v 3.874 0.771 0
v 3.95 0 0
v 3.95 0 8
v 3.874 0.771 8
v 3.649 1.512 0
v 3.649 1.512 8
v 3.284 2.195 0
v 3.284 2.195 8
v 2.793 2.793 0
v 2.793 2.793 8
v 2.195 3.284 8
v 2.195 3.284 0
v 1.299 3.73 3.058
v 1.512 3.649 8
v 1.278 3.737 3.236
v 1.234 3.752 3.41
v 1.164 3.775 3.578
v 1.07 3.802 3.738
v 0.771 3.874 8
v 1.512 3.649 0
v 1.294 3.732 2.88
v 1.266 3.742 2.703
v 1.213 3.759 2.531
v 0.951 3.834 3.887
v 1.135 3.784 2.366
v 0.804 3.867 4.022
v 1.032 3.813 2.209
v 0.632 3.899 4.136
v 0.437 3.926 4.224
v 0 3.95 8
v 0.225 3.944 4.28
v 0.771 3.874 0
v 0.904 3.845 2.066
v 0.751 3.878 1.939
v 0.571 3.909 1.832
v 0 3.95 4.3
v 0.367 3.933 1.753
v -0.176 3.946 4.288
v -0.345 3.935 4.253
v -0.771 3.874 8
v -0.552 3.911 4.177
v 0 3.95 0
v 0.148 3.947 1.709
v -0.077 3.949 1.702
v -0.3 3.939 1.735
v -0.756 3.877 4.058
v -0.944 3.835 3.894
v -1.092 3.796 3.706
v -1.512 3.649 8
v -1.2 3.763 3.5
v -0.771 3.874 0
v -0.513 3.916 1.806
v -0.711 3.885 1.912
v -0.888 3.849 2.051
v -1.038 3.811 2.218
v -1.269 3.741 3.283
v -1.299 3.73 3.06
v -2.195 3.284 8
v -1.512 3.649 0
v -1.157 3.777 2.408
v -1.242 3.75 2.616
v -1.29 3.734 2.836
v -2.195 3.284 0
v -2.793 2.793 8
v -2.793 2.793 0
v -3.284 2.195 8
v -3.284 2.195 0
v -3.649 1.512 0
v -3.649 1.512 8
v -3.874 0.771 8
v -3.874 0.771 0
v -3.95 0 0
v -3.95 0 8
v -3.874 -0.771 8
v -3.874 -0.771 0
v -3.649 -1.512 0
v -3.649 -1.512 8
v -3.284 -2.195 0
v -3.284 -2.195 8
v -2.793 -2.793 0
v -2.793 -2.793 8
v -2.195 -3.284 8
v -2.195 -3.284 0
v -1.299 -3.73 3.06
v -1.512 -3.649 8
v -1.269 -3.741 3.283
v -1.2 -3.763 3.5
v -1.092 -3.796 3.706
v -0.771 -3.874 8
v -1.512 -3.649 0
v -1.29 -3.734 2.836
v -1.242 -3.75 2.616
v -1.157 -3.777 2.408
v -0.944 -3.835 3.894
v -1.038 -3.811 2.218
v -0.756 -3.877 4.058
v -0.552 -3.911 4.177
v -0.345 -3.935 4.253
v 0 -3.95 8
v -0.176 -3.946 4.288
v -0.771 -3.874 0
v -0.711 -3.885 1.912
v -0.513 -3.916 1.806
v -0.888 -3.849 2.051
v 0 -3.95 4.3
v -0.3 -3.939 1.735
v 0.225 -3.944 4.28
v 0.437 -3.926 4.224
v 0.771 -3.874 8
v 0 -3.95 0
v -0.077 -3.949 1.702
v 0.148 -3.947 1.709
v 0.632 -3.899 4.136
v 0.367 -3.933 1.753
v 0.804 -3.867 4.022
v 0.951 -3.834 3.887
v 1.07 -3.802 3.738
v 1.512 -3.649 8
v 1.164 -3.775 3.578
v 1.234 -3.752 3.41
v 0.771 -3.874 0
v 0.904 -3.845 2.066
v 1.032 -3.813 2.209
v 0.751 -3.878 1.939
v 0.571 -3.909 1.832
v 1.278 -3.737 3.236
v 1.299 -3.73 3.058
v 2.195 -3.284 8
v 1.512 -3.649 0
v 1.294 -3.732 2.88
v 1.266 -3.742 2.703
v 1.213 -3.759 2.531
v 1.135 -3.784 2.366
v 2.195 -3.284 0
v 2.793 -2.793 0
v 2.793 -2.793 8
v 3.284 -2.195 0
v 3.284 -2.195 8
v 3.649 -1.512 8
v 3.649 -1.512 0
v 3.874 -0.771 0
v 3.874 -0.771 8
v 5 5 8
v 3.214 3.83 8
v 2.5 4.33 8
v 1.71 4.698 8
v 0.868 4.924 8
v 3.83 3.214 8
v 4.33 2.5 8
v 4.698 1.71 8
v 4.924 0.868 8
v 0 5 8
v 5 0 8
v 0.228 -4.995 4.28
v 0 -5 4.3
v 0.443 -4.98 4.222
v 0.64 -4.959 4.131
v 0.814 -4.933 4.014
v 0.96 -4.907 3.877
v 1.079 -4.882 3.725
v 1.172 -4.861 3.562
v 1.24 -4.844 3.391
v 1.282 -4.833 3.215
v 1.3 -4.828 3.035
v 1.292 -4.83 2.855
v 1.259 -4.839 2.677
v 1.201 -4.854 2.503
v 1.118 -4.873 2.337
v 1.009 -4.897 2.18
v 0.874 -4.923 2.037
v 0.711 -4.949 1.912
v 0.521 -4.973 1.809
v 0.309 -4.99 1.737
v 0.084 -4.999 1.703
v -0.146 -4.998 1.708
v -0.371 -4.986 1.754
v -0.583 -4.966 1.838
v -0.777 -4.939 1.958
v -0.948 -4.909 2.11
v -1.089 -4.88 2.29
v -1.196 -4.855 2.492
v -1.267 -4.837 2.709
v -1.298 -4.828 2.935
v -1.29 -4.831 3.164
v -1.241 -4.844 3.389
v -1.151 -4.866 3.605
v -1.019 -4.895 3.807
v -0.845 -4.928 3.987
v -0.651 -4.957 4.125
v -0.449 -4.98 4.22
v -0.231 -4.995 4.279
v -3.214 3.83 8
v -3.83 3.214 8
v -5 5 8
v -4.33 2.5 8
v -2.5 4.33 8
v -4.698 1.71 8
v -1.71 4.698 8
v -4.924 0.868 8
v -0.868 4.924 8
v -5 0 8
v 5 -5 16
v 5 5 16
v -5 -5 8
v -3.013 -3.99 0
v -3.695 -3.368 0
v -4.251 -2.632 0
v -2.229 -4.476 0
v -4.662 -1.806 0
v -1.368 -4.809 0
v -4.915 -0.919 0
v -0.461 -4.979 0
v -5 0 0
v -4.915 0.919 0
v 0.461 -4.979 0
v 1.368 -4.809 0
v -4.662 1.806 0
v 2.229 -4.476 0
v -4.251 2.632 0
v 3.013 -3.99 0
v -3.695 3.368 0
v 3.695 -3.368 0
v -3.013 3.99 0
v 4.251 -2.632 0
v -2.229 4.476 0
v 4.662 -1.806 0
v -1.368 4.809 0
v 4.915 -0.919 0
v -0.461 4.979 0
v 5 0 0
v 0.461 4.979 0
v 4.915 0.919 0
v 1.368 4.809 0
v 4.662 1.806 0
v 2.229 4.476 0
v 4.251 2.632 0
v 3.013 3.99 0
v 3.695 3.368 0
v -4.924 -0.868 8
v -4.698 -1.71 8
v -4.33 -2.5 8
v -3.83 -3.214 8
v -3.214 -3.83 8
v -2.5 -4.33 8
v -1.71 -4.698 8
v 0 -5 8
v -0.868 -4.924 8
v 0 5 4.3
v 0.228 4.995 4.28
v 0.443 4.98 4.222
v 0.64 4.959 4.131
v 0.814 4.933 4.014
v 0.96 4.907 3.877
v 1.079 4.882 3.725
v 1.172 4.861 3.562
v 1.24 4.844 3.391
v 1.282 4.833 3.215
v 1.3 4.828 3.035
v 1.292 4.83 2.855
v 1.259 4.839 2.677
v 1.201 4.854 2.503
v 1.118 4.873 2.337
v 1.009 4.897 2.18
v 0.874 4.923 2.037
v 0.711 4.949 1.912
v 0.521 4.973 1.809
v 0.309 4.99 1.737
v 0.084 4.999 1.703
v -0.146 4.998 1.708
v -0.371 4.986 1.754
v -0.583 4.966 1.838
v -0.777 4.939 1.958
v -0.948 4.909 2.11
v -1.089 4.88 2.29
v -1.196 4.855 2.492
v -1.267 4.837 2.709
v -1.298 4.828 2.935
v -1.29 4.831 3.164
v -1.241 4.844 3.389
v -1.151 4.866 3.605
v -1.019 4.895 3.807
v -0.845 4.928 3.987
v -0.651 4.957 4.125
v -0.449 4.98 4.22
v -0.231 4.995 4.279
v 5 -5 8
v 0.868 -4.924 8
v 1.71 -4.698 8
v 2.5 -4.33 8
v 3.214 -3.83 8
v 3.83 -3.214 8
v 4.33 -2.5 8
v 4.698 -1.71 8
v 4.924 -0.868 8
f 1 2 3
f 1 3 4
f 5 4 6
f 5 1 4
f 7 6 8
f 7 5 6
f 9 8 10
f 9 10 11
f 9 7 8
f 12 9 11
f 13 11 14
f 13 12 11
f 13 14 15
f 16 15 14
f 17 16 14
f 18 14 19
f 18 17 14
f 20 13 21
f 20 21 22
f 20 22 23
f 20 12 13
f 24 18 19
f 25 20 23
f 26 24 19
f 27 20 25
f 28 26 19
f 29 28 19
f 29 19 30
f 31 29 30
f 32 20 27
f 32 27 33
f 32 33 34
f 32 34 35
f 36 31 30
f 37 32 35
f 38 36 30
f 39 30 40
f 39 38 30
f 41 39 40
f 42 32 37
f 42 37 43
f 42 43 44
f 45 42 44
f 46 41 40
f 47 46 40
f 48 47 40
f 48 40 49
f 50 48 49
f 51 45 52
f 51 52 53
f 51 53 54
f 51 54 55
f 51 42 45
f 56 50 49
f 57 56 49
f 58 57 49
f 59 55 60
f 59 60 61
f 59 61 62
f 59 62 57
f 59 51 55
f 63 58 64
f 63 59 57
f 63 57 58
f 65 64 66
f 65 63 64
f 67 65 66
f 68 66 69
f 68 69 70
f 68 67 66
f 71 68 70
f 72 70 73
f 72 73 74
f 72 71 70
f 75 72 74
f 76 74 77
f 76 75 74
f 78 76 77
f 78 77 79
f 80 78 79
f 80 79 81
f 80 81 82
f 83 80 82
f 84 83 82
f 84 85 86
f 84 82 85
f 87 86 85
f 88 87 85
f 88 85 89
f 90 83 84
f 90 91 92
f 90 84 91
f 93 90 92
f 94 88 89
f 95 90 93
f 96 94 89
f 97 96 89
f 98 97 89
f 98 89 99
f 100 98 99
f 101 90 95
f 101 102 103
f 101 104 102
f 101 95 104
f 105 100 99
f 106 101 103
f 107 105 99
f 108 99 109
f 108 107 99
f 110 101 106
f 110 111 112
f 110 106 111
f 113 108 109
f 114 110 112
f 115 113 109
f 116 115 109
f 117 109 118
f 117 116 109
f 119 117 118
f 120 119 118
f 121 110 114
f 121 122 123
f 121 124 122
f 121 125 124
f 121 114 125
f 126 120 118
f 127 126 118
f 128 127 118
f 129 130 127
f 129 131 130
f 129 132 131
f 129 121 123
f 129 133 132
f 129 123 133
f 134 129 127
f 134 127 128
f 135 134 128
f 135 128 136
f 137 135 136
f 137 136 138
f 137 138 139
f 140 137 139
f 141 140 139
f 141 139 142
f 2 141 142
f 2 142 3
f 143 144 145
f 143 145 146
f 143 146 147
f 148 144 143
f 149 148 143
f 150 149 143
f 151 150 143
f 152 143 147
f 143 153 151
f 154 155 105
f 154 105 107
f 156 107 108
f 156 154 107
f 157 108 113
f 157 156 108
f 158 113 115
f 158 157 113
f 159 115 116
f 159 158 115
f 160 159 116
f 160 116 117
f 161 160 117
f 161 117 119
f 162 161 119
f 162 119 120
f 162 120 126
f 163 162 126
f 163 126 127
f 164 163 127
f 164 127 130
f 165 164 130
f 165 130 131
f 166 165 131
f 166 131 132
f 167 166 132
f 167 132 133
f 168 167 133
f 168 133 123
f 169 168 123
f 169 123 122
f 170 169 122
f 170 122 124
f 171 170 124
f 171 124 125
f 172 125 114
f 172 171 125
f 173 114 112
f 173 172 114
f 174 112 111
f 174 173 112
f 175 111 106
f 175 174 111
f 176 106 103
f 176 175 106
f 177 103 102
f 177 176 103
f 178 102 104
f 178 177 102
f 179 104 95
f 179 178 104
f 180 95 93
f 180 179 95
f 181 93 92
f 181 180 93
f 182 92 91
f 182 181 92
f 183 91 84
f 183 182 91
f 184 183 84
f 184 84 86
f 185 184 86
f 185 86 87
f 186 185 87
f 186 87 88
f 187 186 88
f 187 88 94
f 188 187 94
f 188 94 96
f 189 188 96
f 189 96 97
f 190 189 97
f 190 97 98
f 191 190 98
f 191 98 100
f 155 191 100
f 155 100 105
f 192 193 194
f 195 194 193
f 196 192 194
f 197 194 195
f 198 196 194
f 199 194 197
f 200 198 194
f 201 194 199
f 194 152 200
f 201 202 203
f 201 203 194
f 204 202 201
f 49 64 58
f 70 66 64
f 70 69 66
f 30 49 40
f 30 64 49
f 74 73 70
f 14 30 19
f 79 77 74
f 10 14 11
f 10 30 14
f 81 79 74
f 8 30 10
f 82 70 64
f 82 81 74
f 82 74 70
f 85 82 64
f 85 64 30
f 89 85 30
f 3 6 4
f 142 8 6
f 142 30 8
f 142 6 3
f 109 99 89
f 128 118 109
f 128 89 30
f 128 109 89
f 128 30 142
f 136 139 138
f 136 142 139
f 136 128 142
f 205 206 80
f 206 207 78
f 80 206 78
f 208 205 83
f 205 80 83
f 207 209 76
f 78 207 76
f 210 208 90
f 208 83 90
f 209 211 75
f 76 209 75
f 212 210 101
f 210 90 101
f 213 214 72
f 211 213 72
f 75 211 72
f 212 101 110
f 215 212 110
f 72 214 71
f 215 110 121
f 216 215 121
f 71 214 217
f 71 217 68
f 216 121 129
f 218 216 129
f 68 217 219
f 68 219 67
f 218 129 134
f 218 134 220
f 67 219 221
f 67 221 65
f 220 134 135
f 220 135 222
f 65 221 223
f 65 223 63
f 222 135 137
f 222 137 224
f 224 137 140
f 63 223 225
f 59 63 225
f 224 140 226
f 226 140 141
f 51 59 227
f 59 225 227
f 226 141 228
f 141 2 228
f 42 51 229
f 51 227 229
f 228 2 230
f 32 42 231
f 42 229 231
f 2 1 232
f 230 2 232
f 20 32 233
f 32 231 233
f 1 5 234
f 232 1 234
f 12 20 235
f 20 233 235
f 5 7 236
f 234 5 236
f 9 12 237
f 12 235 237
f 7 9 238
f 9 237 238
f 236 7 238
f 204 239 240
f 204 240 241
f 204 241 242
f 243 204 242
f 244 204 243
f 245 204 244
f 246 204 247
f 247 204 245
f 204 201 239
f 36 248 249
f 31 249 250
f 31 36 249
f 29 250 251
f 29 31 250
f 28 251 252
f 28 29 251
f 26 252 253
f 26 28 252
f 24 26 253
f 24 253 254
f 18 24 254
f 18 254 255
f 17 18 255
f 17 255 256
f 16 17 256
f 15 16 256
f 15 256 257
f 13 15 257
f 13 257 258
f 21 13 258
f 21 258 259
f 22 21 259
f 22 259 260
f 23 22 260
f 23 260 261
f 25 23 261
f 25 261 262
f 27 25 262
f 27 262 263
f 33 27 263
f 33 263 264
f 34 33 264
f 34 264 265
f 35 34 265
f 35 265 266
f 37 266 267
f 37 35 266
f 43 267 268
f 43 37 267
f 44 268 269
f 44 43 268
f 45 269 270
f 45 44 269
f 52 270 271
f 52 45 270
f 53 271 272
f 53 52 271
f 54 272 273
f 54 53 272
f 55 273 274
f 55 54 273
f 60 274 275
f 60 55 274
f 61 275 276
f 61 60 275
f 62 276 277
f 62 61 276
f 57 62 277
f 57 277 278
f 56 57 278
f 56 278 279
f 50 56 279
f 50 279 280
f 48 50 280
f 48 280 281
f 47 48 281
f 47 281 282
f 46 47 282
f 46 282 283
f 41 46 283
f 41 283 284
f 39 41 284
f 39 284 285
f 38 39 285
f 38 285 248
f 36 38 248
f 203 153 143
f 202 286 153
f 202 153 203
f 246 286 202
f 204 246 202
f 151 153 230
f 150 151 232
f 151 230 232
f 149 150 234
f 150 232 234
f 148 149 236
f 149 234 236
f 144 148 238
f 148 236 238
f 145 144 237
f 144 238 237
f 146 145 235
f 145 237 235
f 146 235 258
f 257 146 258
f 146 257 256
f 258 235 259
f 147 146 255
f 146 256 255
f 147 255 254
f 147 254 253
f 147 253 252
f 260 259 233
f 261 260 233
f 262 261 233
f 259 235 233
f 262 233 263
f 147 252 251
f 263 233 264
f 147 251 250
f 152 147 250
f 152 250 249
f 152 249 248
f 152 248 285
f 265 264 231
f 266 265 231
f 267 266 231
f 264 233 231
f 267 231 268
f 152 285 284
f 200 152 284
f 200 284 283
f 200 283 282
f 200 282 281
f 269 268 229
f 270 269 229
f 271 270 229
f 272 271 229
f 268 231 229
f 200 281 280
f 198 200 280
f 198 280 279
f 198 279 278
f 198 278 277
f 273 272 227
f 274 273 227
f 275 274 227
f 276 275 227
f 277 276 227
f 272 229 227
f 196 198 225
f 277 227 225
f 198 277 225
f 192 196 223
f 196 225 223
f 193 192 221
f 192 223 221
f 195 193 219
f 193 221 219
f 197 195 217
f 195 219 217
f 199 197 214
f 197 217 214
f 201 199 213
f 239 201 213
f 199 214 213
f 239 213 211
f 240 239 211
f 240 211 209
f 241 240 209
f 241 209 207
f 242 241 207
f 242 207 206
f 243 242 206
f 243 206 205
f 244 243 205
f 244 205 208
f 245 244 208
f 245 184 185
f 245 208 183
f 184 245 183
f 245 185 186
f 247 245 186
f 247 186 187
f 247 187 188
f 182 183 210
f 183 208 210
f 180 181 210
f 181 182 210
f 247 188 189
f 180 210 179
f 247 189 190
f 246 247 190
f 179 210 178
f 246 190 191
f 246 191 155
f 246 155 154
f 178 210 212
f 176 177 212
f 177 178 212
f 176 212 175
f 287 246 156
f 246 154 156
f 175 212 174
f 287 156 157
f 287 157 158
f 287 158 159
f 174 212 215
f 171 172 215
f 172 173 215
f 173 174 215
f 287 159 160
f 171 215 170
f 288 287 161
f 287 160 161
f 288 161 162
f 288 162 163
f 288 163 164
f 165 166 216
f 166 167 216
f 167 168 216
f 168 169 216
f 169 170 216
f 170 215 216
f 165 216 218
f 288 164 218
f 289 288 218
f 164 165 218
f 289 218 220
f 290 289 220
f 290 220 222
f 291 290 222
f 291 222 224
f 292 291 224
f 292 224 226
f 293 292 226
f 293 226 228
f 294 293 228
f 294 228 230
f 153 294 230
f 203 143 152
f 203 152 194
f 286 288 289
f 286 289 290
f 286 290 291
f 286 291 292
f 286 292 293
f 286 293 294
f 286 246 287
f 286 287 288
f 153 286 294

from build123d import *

# Parameters (mm, degrees)
SKETCH1_R                = 5
SKETCH1_R_2              = 3.95
BOSS_EXTRUDE1_DEPTH      = 8
BOSS_EXTRUDE2_DEPTH      = 5
BOSS_EXTRUDE2_DEPTH_BACK = 5
CUT_EXTRUDE1_DEPTH       = 18.492855685
CUT_EXTRUDE1_DEPTH_BACK  = 18.492855685
SKETCH4_R                = 1.3


with BuildPart() as part:
    # Sketch1 → Boss-Extrude1 (new body)
    with BuildSketch(Plane.XY):
        Circle(SKETCH1_R)
        Circle(SKETCH1_R_2, mode=Mode.SUBTRACT)
    extrude(amount=BOSS_EXTRUDE1_DEPTH)

    # Sketch3 → Boss-Extrude2 (add, two sides: drawn at the far end of the back side and taken through both)
    with BuildSketch(Plane(origin=(0, 0, 0), x_dir=(1, 0, 0), z_dir=(0, 1, 0)).offset(-BOSS_EXTRUDE2_DEPTH_BACK)):
        Polygon((5, -16), (-5, -8), (5, -8), align=None)
    extrude(amount=BOSS_EXTRUDE2_DEPTH + BOSS_EXTRUDE2_DEPTH_BACK)

    # Sketch4 → Cut-Extrude1 (cut, two sides: drawn at the far end of the back side and taken through both)
    with BuildSketch(Plane(origin=(0, 0, 0), x_dir=(1, 0, 0), z_dir=(0, 1, 0)).offset(-CUT_EXTRUDE1_DEPTH_BACK)):
        with Locations((0, -3)):
            Circle(SKETCH4_R)
    extrude(amount=CUT_EXTRUDE1_DEPTH + CUT_EXTRUDE1_DEPTH_BACK, mode=Mode.SUBTRACT)


solid = part.part
